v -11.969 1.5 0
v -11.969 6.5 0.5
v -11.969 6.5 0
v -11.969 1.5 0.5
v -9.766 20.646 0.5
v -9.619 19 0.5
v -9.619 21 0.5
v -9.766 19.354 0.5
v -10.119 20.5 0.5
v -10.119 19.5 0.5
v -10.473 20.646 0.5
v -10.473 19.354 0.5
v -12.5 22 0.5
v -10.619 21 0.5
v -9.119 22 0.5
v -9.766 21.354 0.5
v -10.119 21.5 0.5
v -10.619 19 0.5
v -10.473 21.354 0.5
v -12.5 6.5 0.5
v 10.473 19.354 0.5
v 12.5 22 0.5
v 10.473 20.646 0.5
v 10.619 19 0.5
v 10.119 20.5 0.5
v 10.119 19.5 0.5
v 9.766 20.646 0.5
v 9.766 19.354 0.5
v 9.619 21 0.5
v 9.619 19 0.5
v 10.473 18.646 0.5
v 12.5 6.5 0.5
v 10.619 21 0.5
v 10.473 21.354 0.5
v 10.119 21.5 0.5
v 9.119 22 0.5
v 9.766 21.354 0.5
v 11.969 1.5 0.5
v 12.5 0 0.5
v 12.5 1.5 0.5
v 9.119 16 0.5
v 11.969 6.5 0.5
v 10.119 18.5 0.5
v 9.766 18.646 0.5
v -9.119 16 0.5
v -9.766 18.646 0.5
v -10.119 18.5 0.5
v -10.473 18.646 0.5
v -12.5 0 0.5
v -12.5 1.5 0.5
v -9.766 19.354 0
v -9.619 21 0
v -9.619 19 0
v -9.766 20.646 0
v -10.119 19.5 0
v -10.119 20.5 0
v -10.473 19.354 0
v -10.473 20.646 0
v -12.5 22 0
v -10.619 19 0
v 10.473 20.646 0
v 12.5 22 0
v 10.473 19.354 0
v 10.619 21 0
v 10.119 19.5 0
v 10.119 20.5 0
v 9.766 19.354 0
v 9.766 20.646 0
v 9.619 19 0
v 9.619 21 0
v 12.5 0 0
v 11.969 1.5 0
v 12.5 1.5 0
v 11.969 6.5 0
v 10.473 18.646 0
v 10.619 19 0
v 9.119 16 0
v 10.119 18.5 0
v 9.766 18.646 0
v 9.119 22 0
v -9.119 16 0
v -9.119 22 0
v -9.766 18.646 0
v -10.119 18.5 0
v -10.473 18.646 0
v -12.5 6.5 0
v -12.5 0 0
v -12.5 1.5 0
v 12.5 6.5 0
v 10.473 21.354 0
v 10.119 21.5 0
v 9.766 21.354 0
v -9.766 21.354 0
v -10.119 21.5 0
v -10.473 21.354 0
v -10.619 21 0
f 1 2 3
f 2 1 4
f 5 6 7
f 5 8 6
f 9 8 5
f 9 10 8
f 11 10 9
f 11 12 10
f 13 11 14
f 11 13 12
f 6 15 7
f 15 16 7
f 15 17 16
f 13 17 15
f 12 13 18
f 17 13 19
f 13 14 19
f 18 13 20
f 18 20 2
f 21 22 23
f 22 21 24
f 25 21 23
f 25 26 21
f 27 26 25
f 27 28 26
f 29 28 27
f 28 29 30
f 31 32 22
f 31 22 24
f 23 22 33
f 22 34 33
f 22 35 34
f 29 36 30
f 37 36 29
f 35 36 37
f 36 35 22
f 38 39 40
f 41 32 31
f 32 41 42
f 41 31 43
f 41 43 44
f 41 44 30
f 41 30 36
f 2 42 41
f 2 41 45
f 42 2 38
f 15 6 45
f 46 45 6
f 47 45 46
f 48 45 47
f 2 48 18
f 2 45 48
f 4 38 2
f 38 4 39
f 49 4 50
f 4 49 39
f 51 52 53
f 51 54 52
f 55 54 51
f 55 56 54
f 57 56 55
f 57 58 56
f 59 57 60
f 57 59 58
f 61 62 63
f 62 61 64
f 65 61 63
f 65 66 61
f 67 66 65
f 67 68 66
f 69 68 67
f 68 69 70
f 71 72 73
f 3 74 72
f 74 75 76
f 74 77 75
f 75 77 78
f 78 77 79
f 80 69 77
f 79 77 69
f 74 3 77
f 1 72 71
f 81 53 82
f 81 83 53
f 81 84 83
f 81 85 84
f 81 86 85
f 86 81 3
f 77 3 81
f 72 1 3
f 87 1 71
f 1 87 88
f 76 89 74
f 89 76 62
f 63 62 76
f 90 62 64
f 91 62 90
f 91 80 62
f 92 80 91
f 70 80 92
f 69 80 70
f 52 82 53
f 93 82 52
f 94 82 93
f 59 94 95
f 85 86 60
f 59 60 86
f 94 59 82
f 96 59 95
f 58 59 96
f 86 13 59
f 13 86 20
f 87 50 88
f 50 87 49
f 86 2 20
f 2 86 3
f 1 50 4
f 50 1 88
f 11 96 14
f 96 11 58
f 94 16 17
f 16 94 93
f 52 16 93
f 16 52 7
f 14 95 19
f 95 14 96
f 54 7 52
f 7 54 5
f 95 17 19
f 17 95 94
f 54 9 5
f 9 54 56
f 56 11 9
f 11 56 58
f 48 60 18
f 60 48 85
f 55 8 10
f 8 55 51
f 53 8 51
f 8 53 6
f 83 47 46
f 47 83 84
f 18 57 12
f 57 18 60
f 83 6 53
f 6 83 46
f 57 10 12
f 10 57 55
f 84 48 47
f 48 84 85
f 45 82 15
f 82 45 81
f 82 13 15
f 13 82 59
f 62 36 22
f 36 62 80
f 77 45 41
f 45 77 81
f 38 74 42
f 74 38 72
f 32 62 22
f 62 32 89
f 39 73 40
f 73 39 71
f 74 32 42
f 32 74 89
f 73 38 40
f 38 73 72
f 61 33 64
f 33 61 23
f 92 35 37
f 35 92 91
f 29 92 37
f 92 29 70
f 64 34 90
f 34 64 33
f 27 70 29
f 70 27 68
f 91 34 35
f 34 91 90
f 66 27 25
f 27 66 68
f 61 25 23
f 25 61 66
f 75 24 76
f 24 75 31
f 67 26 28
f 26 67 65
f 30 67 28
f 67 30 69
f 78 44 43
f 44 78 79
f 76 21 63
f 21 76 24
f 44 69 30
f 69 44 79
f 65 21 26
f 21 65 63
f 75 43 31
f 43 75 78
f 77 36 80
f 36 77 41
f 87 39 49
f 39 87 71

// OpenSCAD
// file: modus.scad
//Corner Joint - allows the sides of two parts to create inlayed corner. Aids with welding.
//need to verify module math is the same throughout all parts.

module cornerjoint(Z,L,H,EndGap,PadL,PadH,CJangle,CJcenter){
    //change so that H = Z of inlayed part (usually 0.5)
    //add center and angle in degrees option, orgin far side of cut out area

     if((CJangle==0)&&(CJcenter==0))
      {    
        translate([0,0,0])
        rotate([0,0,CJangle])
        difference(){
        cube([L,H+PadH,Z]);
        translate([EndGap,H,0])
        cube([PadL,PadH,Z]);
        translate([L-EndGap-PadL,H,0])
        cube([PadL,PadH,Z]);}
      }    
else if((CJangle==90)&&(CJcenter==0))
      {    
        translate([H+PadH,0,0])
        rotate([0,0,CJangle])
        difference(){
        cube([L,H+PadH,Z]);
        translate([EndGap,H,0])
        cube([PadL,PadH,Z]);
        translate([L-EndGap-PadL,H,0])
        cube([PadL,PadH,Z]);}
      }
else if((CJangle==180)&&(CJcenter==0))       
      {    
        translate([L,H+PadH,0])
        rotate([0,0,CJangle])
        difference(){
        cube([L,H+PadH,Z]);
        translate([EndGap,H,0])
        cube([PadL,PadH,Z]);
        translate([L-EndGap-PadL,H,0])
        cube([PadL,PadH,Z]);}
      }
else if((CJangle==270)&&(CJcenter==0))
      {    
        translate([0,L,0])
        rotate([0,0,CJangle])
        difference(){
        cube([L,H+PadH,Z]);
        translate([EndGap,H,0])
        cube([PadL,PadH,Z]);
        translate([L-EndGap-PadL,H,0])
        cube([PadL,PadH,Z]);}
      }  
      
//centered     
   
else if((CJangle==0)&&(CJcenter==1))
      {    
        translate([-L/2,0,0])
        rotate([0,0,CJangle])
        difference(){
        cube([L,H+PadH,Z]);
        translate([EndGap,H,0])
        cube([PadL,PadH,Z]);
        translate([L-EndGap-PadL,H,0])
        cube([PadL,PadH,Z]);}
      }  
else if((CJangle==90)&&(CJcenter==1))
      {    
        translate([0,-L/2,0])
        rotate([0,0,CJangle])
        difference(){
        cube([L,H+PadH,Z]);
        translate([EndGap,H,0])
        cube([PadL,PadH,Z]);
        translate([L-EndGap-PadL,H,0])
        cube([PadL,PadH,Z]);}
      }
else if((CJangle==180)&&(CJcenter==1))       
      {    
        translate([L/2,0,0])
        rotate([0,0,CJangle])
        difference(){
        cube([L,H+PadH,Z]);
        translate([EndGap,H,0])
        cube([PadL,PadH,Z]);
        translate([L-EndGap-PadL,H,0])
        cube([PadL,PadH,Z]);}
      }
else if((CJangle==270)&&(CJcenter==1))
      {    
        translate([0,L/2,0])
        rotate([0,0,CJangle])
        difference(){
        cube([L,H+PadH,Z]);
        translate([EndGap,H,0])
        cube([PadL,PadH,Z]);
        translate([L-EndGap-PadL,H,0])
        cube([PadL,PadH,Z]);}
      }
} //end cornerjoint module

//Tab Insert - used to cut a hole for an abutting part to insert into. Typically aids with welding the two parts.
module tabinsert(X,Y,Z,dGap,cGap,c1,c2,c3,c4,c5,c6,c7,c8,center){
    translate([-dGap-(center*(X/2)),-dGap-(center*(Y/2)),0]){
        //main cut
        cube([X+(dGap*2),Y+(dGap*2),Z]);
        //corner c1c2
        translate([-cGap,(Y+(dGap*2))-c1+cGap,0])
            {
        cube([c2,c1,Z]);}
       //corner c3c4
       translate([(X+(dGap*2))-c3+cGap,(Y+(dGap*2))-c4+cGap,0]){
           cube([c3,c4,Z]);
       }
       //corner c5c6
       translate([(X+(dGap*2))-c6+cGap,-cGap,0])
      {
          cube([c6,c5,Z]);
      }
       
       //corner c7c8 
       translate([-cGap,-cGap,0]){
           cube([c7,c8,Z]);
       }
    
    } //end center translate
} //end tabinsert module
 

module nut(flattoflat,nutheight){  //distance from one flat side to the other flat side "A/F"

//typical sizes found here:
//https://en.wikipedia.org/wiki/Nut_(hardware)

difference(){
    translate([0,0,nutheight/2])
cube(size = [10,10,nutheight], center = true);
    
for(i=[1:6]){
    rotate([0,0,i*60])
difference(){
    translate([-10,0,0])
    cube([20,20,nutheight]);
    translate([-10,0,0])
    cube([20,flattoflat/2,nutheight]);
}  //end difference
}  //end for
}  //end differeence
}  //end module
// file: vars.scad
brickW=6; 
brickL=24;
brickCH=6; //Is brick height being shortened by d1z??

//3.625 x 2.25 x 8
//6 x 12 x 6

grateX=56;
grateY=23;
grateH=37; //Height mounted above press's frame
grateA=17.5; //angle of grate

//grateX=56;
//grateY=23;
//grateH=37; //Height mounted above press's frame
//grateA=17.5; //angle of grate


$fn=8; //defines resolution of circles. 8 is okay for review. 100  or greater should be used for for final dxf export.

dZstandard=0.5; //thickness of steel to be cut for drawer parts
fZstandard=0.5;
aZstandard=0.5; //thickness of steel to be cut for arm parts
hZstandard=0.125;

fBOLTHOLEstandardD=1; //standard bolts used on frame
aBOLTHOLEstandardD=1;

sliderodholeOD=1.2; 
d1bushingOD=1.25;
d1bushingL=1.25;
d1shaftOD=1;
d1bolt1OD=1;
d1bolt2OD=0.75;
d1nut2AF=1.25;
d1nut2H=0.665;


dGap=0.03125; //gap between a hole cut's edge and the part sitting within the hole. //D3 appears to use 0.3125, is this in error?

//all parts set to standard thickness below
//off standard preferences can be defined below

//drawer
drawergap=0.0283;  //extra room for drawer to slide in the space between f1 and f4
drawerHgap=0.1884;  //total extra space from drawer sides to frame walls. sum of both sides.

d2clevispinaccessholeOD=3;

d1z=dZstandard;
d2z=dZstandard;
d3z=dZstandard;
d4z=dZstandard;
d5z=dZstandard;
d6z=dZstandard;
d5z=dZstandard;
d7z=dZstandard;
d8z=dZstandard;
d9z=dZstandard;

d11z=dZstandard;
d12z=dZstandard;


//frame

f1y=6;
f1z=fZstandard;


f2y=3.5;
f2z=fZstandard;

f3y=3.5;
f3z=fZstandard;

f4y=11;
f4z=fZstandard;

f5y=3.5;
f5z=fZstandard;

f6y=8;
f6z=fZstandard;

f8y=brickW;
f8z=fZstandard;
f8boltD=1;

f9y=4.5;

f9z=fZstandard;




f12z=fZstandard;   

f11x=1.25;
f11z=fZstandard;

f13z=fZstandard;

f14y=3.5;
f14z=fZstandard;

//arms

a1x=4;
a1z=aZstandard;
a1out=24; //length from frame to A5 edge for bricks to sit on as they exit

a2x=6;
a2z=aZstandard;

a3x=4;
a3y=72;
a3z=aZstandard;

a4x=6;
a4y=72;
a4z=aZstandard;

a5x=6;
a5y=72;
a5z=aZstandard;

a6z=aZstandard;

//guards

h1x=grateX;
h1y=grateH;  //might need to tweak for grate thickness

h1z=hZstandard;
h2z=hZstandard;
h3z=hZstandard;
h4z=hZstandard;
h5z=hZstandard;
h6z=hZstandard;
h7z=hZstandard;
h8z=hZstandard;

//
//Input your main cylinder's dimenions here
//
cylMainBore = 5;
cylMainStroke = 16;
cylMainExt = 43;
cylMainRet = 27;
cylMainA = (cylMainRet-cylMainStroke); //center to center minus stroke length
cylMainB = 0.25; // cylinder wall thickness
cylMainD = 2.5; //Rod OD
cylMainE = 5.75; //rear pin holder width
cylMainG = 4; //rod pin holder width
cylMainJ = 3.8; //distance from the end of the cylinder body to rod pin center
cylMainR = 1.52; //pin hole ID
cylMainS = 2.5; //pin holder OD

//
//Input your drawer cylinder's dimenions here
//
//
cylDrawerBore = 5;
cylDrawerStroke = 16;
cylDrawerExt = 43;
cylDrawerRet = 27;
cylDrawerA = (cylMainRet-cylMainStroke); //center to center minus stroke length
cylDrawerB = 0.25; // cylinder wall thickness
cylDrawerD = 2.5; //Rod OD
cylDrawerE = 5.75; //rear pin holder width
cylDrawerG = 4; //rod pin holder width
cylDrawerJ = 3.8; //distance from the end of the cylinder body to rod pin center
cylDrawerR = 1.52; //pin hole ID
cylDrawerS = 2.5; //pin holder OD

cylinderDRAWERbodyH=3; //measured when in position, largest length from top to bottom of cylinder
cylinderDRAWERminC2C=0; //drawer's hydraulic cylinder's distance from the center of one mounting hole to the center of the other when fully compressed.
cylinderDRAWERmaxC2C=0; ///drawer's hydraulic cylinder's distance from the center of one mounting hole to the center of the other when fully extended.
cylinderDRAWERrodclevisW=2.5; //width of cylinders' clevis on end of rod
cylinderDRAWERrodclevisID=1;
cylinderDRAWERrodclevisOD=2;
cylinderDRAWERrearclevisW=2.5; //width of mounting clevis cylinder body
cylinderDRAWERrearclevisID=1;
cylinderDRAWERrearclevisOD=2;
cylinderDRAWERrearclevisClearance=3; //usable space around rear clevis pin (in diameter). be aware of hyraulic fittings.

//the following variables are calculated in order of dependence on preceding variables

d3x=brickL+(d2z*2);
d3y=brickCH-d1z;
d4x=brickW+d3z+d3z;
d4y=brickCH-d1z;
d5x=brickL+(d2z*2);
d5y=brickW;
d6x=brickL+(d2z*2);
d6y=brickCH;
d7x=cylinderDRAWERrearclevisClearance;
d7y=a4z+d8z+cylinderDRAWERbodyH;
d9x=cylinderDRAWERbodyH+d6z; //should be based on clevis size?
d9y=cylinderDRAWERbodyH+d8z;
d8x=brickL+(d2z*2);
d8y=max(5,(d9x-d6z));   //need to review fundamentals, 5 minimun unless d9 gets larger than d8
d11x=1.5+(d1bolt1OD*2)+d1bushingOD;
d11y=max((0.5+d1bushingL),4);

d12x=d8x;
d12y=d11y+1;

f1x=((brickL+(d2z*2)+drawerHgap+(f9y*2)));
f3x=f1x;

d1x=(brickL+d2z+d2z);
//d1x=(((f1x/2)-(((brickL+(d2z*2)+drawerHgap)/2)-fZstandard-(sliderodholeOD/2)))+(d11x/2))*2;
d1y=((brickW+d3z+d3z)*3)+1;

d2x=d8y+d6z+brickW+d3z+d5y+d3z;
d2y=brickCH;



f11y=f8y;
f6x=brickL+(d2z*2)+(f9y*2)+drawerHgap;

f9x=(f2z+((cylMainS+0.125)/2)+cylMainRet-cylMainJ+1+f4y+drawergap+d2y+f1y);  //leaves 1" between top of cylinder and bottom of F4
f8x=f9x;


f2x=brickL+(d2z*2)+drawerHgap+(f9y*2)-(1.4*2);  //distance between large cut outs in f9

f5x=brickL+(d2z*2)+drawerHgap+(f9y*2)+(a1x*2); //distance between outer edges of each A1

f4x=f5x-0.5;   //same as f5 but minus 0.25 on each side to give a little overhang

f14x=brickL+(1*2)+(.125*2)+(dGap*2); 

f12x=f3x;
f12y=(f3y*2)+brickW;

sliderodoffset=(((brickL+(d2z*2)+drawerHgap)/2)-fZstandard-(sliderodholeOD/2));

distancetof8center=(cylDrawerExt+(a4x/2)+((d9x-d6z)/2)+d6z+(brickW/2)); //F8 center on A1

a1y=distancetof8center+(brickW/2)+a1out;
a2y=a1y;

h7x=f5x-((a1x/2)*2)+(1.5*2);
h7y=cylDrawerStroke;

h8x=f5x-((a1x/2)*2)+(1.5*2);
h8y=a1out-a5x-f5y;  //distance between a5 and f5

hopperBaseX=brickL;
hopperBaseY=brickW;

h2x=grateX;
h2y=sqrt(((h1y-(sin(grateA)*grateY))*(h1y-(sin(grateA)*grateY)))+(((cos(grateA)*grateY)-hopperBaseY)*((cos(grateA)*grateY)-hopperBaseY)));

//h1y-(sin(grateA)*grateY)
//(cos(grateA)*grateY)-hopperBaseY

echo(h1y-(sin(grateA)*grateY));
echo((cos(grateA)*grateY)-hopperBaseY);
echo(h2y);
echo(atan((h1y-(sin(grateA)*grateY))/((cos(grateA)*grateY)-hopperBaseY)));
echo((h1y-(sin(grateA)*grateY))/(h1y));

// ECHO - REQUIRED PARTS BASED ON INPUTS

echo(str("Minimum drawer cylinder stroke length: ",(d3z*2)+d5y+brickW));
//would be cool to validate and confirm user inputed stroke length. set error=1; if drawer cylinder is not long enough. print an echo warning.

echo(str("Grate hieght above ground level: ",(1)));
// main file
include <vars.scad>;
use <modus.scad>;

d1p();

module d1p(){

difference(){
translate([-(d1x/2),0,0])
cube([d1x,d1y,d1z]);
translate([-(d1x/2),0,0])
cuts();
translate([(d1x/2),0,0])
mirror([1,0,0])
cuts();
} //end difference
module cuts(){

    translate([(d1x-brickL-d2z-d2z)/2,1.5,0]) //1.5 could be better defined
    cube([d2z+dGap,d3z+brickW-1.5,d1z]);  //June freecad model has larger cut out
    
    //d11 bolt 1a - will these holes need to be tapped?
    translate([((d1x/2)-(((brickL+(d2z*2)+drawerHgap)/2)-fZstandard-(sliderodholeOD/2)))+(d11x/2)-((d1bolt1OD/2)+0.5),d1y-(d1bolt1OD/2)-0.5,0]) 
        cylinder(h = f1z, r = d1bolt1OD/2);     
    
    //d11 bolt 1b - will these holes need to be tapped?
    translate([((d1x/2)-(((brickL+(d2z*2)+drawerHgap)/2)-fZstandard-(sliderodholeOD/2)))+(d11x/2)-((d1bolt1OD/2)+0.5),d1y-d11y+((d1bolt1OD/2)+0.5),0]) 
        cylinder(h = f1z, r = d1bolt1OD/2);     

    //mid section excess cut
    translate([((d1x/2)-(((brickL+(d2z*2)+drawerHgap)/2)-fZstandard-(sliderodholeOD/2)))+(d11x/2),d1y-brickW,0])
    cube([d1x-((((d1x/2)-(((brickL+(d2z*2)+drawerHgap)/2)-fZstandard-(sliderodholeOD/2)))+(d11x/2))*2),brickW,d1z]);

} //end module

} //end d1p module
